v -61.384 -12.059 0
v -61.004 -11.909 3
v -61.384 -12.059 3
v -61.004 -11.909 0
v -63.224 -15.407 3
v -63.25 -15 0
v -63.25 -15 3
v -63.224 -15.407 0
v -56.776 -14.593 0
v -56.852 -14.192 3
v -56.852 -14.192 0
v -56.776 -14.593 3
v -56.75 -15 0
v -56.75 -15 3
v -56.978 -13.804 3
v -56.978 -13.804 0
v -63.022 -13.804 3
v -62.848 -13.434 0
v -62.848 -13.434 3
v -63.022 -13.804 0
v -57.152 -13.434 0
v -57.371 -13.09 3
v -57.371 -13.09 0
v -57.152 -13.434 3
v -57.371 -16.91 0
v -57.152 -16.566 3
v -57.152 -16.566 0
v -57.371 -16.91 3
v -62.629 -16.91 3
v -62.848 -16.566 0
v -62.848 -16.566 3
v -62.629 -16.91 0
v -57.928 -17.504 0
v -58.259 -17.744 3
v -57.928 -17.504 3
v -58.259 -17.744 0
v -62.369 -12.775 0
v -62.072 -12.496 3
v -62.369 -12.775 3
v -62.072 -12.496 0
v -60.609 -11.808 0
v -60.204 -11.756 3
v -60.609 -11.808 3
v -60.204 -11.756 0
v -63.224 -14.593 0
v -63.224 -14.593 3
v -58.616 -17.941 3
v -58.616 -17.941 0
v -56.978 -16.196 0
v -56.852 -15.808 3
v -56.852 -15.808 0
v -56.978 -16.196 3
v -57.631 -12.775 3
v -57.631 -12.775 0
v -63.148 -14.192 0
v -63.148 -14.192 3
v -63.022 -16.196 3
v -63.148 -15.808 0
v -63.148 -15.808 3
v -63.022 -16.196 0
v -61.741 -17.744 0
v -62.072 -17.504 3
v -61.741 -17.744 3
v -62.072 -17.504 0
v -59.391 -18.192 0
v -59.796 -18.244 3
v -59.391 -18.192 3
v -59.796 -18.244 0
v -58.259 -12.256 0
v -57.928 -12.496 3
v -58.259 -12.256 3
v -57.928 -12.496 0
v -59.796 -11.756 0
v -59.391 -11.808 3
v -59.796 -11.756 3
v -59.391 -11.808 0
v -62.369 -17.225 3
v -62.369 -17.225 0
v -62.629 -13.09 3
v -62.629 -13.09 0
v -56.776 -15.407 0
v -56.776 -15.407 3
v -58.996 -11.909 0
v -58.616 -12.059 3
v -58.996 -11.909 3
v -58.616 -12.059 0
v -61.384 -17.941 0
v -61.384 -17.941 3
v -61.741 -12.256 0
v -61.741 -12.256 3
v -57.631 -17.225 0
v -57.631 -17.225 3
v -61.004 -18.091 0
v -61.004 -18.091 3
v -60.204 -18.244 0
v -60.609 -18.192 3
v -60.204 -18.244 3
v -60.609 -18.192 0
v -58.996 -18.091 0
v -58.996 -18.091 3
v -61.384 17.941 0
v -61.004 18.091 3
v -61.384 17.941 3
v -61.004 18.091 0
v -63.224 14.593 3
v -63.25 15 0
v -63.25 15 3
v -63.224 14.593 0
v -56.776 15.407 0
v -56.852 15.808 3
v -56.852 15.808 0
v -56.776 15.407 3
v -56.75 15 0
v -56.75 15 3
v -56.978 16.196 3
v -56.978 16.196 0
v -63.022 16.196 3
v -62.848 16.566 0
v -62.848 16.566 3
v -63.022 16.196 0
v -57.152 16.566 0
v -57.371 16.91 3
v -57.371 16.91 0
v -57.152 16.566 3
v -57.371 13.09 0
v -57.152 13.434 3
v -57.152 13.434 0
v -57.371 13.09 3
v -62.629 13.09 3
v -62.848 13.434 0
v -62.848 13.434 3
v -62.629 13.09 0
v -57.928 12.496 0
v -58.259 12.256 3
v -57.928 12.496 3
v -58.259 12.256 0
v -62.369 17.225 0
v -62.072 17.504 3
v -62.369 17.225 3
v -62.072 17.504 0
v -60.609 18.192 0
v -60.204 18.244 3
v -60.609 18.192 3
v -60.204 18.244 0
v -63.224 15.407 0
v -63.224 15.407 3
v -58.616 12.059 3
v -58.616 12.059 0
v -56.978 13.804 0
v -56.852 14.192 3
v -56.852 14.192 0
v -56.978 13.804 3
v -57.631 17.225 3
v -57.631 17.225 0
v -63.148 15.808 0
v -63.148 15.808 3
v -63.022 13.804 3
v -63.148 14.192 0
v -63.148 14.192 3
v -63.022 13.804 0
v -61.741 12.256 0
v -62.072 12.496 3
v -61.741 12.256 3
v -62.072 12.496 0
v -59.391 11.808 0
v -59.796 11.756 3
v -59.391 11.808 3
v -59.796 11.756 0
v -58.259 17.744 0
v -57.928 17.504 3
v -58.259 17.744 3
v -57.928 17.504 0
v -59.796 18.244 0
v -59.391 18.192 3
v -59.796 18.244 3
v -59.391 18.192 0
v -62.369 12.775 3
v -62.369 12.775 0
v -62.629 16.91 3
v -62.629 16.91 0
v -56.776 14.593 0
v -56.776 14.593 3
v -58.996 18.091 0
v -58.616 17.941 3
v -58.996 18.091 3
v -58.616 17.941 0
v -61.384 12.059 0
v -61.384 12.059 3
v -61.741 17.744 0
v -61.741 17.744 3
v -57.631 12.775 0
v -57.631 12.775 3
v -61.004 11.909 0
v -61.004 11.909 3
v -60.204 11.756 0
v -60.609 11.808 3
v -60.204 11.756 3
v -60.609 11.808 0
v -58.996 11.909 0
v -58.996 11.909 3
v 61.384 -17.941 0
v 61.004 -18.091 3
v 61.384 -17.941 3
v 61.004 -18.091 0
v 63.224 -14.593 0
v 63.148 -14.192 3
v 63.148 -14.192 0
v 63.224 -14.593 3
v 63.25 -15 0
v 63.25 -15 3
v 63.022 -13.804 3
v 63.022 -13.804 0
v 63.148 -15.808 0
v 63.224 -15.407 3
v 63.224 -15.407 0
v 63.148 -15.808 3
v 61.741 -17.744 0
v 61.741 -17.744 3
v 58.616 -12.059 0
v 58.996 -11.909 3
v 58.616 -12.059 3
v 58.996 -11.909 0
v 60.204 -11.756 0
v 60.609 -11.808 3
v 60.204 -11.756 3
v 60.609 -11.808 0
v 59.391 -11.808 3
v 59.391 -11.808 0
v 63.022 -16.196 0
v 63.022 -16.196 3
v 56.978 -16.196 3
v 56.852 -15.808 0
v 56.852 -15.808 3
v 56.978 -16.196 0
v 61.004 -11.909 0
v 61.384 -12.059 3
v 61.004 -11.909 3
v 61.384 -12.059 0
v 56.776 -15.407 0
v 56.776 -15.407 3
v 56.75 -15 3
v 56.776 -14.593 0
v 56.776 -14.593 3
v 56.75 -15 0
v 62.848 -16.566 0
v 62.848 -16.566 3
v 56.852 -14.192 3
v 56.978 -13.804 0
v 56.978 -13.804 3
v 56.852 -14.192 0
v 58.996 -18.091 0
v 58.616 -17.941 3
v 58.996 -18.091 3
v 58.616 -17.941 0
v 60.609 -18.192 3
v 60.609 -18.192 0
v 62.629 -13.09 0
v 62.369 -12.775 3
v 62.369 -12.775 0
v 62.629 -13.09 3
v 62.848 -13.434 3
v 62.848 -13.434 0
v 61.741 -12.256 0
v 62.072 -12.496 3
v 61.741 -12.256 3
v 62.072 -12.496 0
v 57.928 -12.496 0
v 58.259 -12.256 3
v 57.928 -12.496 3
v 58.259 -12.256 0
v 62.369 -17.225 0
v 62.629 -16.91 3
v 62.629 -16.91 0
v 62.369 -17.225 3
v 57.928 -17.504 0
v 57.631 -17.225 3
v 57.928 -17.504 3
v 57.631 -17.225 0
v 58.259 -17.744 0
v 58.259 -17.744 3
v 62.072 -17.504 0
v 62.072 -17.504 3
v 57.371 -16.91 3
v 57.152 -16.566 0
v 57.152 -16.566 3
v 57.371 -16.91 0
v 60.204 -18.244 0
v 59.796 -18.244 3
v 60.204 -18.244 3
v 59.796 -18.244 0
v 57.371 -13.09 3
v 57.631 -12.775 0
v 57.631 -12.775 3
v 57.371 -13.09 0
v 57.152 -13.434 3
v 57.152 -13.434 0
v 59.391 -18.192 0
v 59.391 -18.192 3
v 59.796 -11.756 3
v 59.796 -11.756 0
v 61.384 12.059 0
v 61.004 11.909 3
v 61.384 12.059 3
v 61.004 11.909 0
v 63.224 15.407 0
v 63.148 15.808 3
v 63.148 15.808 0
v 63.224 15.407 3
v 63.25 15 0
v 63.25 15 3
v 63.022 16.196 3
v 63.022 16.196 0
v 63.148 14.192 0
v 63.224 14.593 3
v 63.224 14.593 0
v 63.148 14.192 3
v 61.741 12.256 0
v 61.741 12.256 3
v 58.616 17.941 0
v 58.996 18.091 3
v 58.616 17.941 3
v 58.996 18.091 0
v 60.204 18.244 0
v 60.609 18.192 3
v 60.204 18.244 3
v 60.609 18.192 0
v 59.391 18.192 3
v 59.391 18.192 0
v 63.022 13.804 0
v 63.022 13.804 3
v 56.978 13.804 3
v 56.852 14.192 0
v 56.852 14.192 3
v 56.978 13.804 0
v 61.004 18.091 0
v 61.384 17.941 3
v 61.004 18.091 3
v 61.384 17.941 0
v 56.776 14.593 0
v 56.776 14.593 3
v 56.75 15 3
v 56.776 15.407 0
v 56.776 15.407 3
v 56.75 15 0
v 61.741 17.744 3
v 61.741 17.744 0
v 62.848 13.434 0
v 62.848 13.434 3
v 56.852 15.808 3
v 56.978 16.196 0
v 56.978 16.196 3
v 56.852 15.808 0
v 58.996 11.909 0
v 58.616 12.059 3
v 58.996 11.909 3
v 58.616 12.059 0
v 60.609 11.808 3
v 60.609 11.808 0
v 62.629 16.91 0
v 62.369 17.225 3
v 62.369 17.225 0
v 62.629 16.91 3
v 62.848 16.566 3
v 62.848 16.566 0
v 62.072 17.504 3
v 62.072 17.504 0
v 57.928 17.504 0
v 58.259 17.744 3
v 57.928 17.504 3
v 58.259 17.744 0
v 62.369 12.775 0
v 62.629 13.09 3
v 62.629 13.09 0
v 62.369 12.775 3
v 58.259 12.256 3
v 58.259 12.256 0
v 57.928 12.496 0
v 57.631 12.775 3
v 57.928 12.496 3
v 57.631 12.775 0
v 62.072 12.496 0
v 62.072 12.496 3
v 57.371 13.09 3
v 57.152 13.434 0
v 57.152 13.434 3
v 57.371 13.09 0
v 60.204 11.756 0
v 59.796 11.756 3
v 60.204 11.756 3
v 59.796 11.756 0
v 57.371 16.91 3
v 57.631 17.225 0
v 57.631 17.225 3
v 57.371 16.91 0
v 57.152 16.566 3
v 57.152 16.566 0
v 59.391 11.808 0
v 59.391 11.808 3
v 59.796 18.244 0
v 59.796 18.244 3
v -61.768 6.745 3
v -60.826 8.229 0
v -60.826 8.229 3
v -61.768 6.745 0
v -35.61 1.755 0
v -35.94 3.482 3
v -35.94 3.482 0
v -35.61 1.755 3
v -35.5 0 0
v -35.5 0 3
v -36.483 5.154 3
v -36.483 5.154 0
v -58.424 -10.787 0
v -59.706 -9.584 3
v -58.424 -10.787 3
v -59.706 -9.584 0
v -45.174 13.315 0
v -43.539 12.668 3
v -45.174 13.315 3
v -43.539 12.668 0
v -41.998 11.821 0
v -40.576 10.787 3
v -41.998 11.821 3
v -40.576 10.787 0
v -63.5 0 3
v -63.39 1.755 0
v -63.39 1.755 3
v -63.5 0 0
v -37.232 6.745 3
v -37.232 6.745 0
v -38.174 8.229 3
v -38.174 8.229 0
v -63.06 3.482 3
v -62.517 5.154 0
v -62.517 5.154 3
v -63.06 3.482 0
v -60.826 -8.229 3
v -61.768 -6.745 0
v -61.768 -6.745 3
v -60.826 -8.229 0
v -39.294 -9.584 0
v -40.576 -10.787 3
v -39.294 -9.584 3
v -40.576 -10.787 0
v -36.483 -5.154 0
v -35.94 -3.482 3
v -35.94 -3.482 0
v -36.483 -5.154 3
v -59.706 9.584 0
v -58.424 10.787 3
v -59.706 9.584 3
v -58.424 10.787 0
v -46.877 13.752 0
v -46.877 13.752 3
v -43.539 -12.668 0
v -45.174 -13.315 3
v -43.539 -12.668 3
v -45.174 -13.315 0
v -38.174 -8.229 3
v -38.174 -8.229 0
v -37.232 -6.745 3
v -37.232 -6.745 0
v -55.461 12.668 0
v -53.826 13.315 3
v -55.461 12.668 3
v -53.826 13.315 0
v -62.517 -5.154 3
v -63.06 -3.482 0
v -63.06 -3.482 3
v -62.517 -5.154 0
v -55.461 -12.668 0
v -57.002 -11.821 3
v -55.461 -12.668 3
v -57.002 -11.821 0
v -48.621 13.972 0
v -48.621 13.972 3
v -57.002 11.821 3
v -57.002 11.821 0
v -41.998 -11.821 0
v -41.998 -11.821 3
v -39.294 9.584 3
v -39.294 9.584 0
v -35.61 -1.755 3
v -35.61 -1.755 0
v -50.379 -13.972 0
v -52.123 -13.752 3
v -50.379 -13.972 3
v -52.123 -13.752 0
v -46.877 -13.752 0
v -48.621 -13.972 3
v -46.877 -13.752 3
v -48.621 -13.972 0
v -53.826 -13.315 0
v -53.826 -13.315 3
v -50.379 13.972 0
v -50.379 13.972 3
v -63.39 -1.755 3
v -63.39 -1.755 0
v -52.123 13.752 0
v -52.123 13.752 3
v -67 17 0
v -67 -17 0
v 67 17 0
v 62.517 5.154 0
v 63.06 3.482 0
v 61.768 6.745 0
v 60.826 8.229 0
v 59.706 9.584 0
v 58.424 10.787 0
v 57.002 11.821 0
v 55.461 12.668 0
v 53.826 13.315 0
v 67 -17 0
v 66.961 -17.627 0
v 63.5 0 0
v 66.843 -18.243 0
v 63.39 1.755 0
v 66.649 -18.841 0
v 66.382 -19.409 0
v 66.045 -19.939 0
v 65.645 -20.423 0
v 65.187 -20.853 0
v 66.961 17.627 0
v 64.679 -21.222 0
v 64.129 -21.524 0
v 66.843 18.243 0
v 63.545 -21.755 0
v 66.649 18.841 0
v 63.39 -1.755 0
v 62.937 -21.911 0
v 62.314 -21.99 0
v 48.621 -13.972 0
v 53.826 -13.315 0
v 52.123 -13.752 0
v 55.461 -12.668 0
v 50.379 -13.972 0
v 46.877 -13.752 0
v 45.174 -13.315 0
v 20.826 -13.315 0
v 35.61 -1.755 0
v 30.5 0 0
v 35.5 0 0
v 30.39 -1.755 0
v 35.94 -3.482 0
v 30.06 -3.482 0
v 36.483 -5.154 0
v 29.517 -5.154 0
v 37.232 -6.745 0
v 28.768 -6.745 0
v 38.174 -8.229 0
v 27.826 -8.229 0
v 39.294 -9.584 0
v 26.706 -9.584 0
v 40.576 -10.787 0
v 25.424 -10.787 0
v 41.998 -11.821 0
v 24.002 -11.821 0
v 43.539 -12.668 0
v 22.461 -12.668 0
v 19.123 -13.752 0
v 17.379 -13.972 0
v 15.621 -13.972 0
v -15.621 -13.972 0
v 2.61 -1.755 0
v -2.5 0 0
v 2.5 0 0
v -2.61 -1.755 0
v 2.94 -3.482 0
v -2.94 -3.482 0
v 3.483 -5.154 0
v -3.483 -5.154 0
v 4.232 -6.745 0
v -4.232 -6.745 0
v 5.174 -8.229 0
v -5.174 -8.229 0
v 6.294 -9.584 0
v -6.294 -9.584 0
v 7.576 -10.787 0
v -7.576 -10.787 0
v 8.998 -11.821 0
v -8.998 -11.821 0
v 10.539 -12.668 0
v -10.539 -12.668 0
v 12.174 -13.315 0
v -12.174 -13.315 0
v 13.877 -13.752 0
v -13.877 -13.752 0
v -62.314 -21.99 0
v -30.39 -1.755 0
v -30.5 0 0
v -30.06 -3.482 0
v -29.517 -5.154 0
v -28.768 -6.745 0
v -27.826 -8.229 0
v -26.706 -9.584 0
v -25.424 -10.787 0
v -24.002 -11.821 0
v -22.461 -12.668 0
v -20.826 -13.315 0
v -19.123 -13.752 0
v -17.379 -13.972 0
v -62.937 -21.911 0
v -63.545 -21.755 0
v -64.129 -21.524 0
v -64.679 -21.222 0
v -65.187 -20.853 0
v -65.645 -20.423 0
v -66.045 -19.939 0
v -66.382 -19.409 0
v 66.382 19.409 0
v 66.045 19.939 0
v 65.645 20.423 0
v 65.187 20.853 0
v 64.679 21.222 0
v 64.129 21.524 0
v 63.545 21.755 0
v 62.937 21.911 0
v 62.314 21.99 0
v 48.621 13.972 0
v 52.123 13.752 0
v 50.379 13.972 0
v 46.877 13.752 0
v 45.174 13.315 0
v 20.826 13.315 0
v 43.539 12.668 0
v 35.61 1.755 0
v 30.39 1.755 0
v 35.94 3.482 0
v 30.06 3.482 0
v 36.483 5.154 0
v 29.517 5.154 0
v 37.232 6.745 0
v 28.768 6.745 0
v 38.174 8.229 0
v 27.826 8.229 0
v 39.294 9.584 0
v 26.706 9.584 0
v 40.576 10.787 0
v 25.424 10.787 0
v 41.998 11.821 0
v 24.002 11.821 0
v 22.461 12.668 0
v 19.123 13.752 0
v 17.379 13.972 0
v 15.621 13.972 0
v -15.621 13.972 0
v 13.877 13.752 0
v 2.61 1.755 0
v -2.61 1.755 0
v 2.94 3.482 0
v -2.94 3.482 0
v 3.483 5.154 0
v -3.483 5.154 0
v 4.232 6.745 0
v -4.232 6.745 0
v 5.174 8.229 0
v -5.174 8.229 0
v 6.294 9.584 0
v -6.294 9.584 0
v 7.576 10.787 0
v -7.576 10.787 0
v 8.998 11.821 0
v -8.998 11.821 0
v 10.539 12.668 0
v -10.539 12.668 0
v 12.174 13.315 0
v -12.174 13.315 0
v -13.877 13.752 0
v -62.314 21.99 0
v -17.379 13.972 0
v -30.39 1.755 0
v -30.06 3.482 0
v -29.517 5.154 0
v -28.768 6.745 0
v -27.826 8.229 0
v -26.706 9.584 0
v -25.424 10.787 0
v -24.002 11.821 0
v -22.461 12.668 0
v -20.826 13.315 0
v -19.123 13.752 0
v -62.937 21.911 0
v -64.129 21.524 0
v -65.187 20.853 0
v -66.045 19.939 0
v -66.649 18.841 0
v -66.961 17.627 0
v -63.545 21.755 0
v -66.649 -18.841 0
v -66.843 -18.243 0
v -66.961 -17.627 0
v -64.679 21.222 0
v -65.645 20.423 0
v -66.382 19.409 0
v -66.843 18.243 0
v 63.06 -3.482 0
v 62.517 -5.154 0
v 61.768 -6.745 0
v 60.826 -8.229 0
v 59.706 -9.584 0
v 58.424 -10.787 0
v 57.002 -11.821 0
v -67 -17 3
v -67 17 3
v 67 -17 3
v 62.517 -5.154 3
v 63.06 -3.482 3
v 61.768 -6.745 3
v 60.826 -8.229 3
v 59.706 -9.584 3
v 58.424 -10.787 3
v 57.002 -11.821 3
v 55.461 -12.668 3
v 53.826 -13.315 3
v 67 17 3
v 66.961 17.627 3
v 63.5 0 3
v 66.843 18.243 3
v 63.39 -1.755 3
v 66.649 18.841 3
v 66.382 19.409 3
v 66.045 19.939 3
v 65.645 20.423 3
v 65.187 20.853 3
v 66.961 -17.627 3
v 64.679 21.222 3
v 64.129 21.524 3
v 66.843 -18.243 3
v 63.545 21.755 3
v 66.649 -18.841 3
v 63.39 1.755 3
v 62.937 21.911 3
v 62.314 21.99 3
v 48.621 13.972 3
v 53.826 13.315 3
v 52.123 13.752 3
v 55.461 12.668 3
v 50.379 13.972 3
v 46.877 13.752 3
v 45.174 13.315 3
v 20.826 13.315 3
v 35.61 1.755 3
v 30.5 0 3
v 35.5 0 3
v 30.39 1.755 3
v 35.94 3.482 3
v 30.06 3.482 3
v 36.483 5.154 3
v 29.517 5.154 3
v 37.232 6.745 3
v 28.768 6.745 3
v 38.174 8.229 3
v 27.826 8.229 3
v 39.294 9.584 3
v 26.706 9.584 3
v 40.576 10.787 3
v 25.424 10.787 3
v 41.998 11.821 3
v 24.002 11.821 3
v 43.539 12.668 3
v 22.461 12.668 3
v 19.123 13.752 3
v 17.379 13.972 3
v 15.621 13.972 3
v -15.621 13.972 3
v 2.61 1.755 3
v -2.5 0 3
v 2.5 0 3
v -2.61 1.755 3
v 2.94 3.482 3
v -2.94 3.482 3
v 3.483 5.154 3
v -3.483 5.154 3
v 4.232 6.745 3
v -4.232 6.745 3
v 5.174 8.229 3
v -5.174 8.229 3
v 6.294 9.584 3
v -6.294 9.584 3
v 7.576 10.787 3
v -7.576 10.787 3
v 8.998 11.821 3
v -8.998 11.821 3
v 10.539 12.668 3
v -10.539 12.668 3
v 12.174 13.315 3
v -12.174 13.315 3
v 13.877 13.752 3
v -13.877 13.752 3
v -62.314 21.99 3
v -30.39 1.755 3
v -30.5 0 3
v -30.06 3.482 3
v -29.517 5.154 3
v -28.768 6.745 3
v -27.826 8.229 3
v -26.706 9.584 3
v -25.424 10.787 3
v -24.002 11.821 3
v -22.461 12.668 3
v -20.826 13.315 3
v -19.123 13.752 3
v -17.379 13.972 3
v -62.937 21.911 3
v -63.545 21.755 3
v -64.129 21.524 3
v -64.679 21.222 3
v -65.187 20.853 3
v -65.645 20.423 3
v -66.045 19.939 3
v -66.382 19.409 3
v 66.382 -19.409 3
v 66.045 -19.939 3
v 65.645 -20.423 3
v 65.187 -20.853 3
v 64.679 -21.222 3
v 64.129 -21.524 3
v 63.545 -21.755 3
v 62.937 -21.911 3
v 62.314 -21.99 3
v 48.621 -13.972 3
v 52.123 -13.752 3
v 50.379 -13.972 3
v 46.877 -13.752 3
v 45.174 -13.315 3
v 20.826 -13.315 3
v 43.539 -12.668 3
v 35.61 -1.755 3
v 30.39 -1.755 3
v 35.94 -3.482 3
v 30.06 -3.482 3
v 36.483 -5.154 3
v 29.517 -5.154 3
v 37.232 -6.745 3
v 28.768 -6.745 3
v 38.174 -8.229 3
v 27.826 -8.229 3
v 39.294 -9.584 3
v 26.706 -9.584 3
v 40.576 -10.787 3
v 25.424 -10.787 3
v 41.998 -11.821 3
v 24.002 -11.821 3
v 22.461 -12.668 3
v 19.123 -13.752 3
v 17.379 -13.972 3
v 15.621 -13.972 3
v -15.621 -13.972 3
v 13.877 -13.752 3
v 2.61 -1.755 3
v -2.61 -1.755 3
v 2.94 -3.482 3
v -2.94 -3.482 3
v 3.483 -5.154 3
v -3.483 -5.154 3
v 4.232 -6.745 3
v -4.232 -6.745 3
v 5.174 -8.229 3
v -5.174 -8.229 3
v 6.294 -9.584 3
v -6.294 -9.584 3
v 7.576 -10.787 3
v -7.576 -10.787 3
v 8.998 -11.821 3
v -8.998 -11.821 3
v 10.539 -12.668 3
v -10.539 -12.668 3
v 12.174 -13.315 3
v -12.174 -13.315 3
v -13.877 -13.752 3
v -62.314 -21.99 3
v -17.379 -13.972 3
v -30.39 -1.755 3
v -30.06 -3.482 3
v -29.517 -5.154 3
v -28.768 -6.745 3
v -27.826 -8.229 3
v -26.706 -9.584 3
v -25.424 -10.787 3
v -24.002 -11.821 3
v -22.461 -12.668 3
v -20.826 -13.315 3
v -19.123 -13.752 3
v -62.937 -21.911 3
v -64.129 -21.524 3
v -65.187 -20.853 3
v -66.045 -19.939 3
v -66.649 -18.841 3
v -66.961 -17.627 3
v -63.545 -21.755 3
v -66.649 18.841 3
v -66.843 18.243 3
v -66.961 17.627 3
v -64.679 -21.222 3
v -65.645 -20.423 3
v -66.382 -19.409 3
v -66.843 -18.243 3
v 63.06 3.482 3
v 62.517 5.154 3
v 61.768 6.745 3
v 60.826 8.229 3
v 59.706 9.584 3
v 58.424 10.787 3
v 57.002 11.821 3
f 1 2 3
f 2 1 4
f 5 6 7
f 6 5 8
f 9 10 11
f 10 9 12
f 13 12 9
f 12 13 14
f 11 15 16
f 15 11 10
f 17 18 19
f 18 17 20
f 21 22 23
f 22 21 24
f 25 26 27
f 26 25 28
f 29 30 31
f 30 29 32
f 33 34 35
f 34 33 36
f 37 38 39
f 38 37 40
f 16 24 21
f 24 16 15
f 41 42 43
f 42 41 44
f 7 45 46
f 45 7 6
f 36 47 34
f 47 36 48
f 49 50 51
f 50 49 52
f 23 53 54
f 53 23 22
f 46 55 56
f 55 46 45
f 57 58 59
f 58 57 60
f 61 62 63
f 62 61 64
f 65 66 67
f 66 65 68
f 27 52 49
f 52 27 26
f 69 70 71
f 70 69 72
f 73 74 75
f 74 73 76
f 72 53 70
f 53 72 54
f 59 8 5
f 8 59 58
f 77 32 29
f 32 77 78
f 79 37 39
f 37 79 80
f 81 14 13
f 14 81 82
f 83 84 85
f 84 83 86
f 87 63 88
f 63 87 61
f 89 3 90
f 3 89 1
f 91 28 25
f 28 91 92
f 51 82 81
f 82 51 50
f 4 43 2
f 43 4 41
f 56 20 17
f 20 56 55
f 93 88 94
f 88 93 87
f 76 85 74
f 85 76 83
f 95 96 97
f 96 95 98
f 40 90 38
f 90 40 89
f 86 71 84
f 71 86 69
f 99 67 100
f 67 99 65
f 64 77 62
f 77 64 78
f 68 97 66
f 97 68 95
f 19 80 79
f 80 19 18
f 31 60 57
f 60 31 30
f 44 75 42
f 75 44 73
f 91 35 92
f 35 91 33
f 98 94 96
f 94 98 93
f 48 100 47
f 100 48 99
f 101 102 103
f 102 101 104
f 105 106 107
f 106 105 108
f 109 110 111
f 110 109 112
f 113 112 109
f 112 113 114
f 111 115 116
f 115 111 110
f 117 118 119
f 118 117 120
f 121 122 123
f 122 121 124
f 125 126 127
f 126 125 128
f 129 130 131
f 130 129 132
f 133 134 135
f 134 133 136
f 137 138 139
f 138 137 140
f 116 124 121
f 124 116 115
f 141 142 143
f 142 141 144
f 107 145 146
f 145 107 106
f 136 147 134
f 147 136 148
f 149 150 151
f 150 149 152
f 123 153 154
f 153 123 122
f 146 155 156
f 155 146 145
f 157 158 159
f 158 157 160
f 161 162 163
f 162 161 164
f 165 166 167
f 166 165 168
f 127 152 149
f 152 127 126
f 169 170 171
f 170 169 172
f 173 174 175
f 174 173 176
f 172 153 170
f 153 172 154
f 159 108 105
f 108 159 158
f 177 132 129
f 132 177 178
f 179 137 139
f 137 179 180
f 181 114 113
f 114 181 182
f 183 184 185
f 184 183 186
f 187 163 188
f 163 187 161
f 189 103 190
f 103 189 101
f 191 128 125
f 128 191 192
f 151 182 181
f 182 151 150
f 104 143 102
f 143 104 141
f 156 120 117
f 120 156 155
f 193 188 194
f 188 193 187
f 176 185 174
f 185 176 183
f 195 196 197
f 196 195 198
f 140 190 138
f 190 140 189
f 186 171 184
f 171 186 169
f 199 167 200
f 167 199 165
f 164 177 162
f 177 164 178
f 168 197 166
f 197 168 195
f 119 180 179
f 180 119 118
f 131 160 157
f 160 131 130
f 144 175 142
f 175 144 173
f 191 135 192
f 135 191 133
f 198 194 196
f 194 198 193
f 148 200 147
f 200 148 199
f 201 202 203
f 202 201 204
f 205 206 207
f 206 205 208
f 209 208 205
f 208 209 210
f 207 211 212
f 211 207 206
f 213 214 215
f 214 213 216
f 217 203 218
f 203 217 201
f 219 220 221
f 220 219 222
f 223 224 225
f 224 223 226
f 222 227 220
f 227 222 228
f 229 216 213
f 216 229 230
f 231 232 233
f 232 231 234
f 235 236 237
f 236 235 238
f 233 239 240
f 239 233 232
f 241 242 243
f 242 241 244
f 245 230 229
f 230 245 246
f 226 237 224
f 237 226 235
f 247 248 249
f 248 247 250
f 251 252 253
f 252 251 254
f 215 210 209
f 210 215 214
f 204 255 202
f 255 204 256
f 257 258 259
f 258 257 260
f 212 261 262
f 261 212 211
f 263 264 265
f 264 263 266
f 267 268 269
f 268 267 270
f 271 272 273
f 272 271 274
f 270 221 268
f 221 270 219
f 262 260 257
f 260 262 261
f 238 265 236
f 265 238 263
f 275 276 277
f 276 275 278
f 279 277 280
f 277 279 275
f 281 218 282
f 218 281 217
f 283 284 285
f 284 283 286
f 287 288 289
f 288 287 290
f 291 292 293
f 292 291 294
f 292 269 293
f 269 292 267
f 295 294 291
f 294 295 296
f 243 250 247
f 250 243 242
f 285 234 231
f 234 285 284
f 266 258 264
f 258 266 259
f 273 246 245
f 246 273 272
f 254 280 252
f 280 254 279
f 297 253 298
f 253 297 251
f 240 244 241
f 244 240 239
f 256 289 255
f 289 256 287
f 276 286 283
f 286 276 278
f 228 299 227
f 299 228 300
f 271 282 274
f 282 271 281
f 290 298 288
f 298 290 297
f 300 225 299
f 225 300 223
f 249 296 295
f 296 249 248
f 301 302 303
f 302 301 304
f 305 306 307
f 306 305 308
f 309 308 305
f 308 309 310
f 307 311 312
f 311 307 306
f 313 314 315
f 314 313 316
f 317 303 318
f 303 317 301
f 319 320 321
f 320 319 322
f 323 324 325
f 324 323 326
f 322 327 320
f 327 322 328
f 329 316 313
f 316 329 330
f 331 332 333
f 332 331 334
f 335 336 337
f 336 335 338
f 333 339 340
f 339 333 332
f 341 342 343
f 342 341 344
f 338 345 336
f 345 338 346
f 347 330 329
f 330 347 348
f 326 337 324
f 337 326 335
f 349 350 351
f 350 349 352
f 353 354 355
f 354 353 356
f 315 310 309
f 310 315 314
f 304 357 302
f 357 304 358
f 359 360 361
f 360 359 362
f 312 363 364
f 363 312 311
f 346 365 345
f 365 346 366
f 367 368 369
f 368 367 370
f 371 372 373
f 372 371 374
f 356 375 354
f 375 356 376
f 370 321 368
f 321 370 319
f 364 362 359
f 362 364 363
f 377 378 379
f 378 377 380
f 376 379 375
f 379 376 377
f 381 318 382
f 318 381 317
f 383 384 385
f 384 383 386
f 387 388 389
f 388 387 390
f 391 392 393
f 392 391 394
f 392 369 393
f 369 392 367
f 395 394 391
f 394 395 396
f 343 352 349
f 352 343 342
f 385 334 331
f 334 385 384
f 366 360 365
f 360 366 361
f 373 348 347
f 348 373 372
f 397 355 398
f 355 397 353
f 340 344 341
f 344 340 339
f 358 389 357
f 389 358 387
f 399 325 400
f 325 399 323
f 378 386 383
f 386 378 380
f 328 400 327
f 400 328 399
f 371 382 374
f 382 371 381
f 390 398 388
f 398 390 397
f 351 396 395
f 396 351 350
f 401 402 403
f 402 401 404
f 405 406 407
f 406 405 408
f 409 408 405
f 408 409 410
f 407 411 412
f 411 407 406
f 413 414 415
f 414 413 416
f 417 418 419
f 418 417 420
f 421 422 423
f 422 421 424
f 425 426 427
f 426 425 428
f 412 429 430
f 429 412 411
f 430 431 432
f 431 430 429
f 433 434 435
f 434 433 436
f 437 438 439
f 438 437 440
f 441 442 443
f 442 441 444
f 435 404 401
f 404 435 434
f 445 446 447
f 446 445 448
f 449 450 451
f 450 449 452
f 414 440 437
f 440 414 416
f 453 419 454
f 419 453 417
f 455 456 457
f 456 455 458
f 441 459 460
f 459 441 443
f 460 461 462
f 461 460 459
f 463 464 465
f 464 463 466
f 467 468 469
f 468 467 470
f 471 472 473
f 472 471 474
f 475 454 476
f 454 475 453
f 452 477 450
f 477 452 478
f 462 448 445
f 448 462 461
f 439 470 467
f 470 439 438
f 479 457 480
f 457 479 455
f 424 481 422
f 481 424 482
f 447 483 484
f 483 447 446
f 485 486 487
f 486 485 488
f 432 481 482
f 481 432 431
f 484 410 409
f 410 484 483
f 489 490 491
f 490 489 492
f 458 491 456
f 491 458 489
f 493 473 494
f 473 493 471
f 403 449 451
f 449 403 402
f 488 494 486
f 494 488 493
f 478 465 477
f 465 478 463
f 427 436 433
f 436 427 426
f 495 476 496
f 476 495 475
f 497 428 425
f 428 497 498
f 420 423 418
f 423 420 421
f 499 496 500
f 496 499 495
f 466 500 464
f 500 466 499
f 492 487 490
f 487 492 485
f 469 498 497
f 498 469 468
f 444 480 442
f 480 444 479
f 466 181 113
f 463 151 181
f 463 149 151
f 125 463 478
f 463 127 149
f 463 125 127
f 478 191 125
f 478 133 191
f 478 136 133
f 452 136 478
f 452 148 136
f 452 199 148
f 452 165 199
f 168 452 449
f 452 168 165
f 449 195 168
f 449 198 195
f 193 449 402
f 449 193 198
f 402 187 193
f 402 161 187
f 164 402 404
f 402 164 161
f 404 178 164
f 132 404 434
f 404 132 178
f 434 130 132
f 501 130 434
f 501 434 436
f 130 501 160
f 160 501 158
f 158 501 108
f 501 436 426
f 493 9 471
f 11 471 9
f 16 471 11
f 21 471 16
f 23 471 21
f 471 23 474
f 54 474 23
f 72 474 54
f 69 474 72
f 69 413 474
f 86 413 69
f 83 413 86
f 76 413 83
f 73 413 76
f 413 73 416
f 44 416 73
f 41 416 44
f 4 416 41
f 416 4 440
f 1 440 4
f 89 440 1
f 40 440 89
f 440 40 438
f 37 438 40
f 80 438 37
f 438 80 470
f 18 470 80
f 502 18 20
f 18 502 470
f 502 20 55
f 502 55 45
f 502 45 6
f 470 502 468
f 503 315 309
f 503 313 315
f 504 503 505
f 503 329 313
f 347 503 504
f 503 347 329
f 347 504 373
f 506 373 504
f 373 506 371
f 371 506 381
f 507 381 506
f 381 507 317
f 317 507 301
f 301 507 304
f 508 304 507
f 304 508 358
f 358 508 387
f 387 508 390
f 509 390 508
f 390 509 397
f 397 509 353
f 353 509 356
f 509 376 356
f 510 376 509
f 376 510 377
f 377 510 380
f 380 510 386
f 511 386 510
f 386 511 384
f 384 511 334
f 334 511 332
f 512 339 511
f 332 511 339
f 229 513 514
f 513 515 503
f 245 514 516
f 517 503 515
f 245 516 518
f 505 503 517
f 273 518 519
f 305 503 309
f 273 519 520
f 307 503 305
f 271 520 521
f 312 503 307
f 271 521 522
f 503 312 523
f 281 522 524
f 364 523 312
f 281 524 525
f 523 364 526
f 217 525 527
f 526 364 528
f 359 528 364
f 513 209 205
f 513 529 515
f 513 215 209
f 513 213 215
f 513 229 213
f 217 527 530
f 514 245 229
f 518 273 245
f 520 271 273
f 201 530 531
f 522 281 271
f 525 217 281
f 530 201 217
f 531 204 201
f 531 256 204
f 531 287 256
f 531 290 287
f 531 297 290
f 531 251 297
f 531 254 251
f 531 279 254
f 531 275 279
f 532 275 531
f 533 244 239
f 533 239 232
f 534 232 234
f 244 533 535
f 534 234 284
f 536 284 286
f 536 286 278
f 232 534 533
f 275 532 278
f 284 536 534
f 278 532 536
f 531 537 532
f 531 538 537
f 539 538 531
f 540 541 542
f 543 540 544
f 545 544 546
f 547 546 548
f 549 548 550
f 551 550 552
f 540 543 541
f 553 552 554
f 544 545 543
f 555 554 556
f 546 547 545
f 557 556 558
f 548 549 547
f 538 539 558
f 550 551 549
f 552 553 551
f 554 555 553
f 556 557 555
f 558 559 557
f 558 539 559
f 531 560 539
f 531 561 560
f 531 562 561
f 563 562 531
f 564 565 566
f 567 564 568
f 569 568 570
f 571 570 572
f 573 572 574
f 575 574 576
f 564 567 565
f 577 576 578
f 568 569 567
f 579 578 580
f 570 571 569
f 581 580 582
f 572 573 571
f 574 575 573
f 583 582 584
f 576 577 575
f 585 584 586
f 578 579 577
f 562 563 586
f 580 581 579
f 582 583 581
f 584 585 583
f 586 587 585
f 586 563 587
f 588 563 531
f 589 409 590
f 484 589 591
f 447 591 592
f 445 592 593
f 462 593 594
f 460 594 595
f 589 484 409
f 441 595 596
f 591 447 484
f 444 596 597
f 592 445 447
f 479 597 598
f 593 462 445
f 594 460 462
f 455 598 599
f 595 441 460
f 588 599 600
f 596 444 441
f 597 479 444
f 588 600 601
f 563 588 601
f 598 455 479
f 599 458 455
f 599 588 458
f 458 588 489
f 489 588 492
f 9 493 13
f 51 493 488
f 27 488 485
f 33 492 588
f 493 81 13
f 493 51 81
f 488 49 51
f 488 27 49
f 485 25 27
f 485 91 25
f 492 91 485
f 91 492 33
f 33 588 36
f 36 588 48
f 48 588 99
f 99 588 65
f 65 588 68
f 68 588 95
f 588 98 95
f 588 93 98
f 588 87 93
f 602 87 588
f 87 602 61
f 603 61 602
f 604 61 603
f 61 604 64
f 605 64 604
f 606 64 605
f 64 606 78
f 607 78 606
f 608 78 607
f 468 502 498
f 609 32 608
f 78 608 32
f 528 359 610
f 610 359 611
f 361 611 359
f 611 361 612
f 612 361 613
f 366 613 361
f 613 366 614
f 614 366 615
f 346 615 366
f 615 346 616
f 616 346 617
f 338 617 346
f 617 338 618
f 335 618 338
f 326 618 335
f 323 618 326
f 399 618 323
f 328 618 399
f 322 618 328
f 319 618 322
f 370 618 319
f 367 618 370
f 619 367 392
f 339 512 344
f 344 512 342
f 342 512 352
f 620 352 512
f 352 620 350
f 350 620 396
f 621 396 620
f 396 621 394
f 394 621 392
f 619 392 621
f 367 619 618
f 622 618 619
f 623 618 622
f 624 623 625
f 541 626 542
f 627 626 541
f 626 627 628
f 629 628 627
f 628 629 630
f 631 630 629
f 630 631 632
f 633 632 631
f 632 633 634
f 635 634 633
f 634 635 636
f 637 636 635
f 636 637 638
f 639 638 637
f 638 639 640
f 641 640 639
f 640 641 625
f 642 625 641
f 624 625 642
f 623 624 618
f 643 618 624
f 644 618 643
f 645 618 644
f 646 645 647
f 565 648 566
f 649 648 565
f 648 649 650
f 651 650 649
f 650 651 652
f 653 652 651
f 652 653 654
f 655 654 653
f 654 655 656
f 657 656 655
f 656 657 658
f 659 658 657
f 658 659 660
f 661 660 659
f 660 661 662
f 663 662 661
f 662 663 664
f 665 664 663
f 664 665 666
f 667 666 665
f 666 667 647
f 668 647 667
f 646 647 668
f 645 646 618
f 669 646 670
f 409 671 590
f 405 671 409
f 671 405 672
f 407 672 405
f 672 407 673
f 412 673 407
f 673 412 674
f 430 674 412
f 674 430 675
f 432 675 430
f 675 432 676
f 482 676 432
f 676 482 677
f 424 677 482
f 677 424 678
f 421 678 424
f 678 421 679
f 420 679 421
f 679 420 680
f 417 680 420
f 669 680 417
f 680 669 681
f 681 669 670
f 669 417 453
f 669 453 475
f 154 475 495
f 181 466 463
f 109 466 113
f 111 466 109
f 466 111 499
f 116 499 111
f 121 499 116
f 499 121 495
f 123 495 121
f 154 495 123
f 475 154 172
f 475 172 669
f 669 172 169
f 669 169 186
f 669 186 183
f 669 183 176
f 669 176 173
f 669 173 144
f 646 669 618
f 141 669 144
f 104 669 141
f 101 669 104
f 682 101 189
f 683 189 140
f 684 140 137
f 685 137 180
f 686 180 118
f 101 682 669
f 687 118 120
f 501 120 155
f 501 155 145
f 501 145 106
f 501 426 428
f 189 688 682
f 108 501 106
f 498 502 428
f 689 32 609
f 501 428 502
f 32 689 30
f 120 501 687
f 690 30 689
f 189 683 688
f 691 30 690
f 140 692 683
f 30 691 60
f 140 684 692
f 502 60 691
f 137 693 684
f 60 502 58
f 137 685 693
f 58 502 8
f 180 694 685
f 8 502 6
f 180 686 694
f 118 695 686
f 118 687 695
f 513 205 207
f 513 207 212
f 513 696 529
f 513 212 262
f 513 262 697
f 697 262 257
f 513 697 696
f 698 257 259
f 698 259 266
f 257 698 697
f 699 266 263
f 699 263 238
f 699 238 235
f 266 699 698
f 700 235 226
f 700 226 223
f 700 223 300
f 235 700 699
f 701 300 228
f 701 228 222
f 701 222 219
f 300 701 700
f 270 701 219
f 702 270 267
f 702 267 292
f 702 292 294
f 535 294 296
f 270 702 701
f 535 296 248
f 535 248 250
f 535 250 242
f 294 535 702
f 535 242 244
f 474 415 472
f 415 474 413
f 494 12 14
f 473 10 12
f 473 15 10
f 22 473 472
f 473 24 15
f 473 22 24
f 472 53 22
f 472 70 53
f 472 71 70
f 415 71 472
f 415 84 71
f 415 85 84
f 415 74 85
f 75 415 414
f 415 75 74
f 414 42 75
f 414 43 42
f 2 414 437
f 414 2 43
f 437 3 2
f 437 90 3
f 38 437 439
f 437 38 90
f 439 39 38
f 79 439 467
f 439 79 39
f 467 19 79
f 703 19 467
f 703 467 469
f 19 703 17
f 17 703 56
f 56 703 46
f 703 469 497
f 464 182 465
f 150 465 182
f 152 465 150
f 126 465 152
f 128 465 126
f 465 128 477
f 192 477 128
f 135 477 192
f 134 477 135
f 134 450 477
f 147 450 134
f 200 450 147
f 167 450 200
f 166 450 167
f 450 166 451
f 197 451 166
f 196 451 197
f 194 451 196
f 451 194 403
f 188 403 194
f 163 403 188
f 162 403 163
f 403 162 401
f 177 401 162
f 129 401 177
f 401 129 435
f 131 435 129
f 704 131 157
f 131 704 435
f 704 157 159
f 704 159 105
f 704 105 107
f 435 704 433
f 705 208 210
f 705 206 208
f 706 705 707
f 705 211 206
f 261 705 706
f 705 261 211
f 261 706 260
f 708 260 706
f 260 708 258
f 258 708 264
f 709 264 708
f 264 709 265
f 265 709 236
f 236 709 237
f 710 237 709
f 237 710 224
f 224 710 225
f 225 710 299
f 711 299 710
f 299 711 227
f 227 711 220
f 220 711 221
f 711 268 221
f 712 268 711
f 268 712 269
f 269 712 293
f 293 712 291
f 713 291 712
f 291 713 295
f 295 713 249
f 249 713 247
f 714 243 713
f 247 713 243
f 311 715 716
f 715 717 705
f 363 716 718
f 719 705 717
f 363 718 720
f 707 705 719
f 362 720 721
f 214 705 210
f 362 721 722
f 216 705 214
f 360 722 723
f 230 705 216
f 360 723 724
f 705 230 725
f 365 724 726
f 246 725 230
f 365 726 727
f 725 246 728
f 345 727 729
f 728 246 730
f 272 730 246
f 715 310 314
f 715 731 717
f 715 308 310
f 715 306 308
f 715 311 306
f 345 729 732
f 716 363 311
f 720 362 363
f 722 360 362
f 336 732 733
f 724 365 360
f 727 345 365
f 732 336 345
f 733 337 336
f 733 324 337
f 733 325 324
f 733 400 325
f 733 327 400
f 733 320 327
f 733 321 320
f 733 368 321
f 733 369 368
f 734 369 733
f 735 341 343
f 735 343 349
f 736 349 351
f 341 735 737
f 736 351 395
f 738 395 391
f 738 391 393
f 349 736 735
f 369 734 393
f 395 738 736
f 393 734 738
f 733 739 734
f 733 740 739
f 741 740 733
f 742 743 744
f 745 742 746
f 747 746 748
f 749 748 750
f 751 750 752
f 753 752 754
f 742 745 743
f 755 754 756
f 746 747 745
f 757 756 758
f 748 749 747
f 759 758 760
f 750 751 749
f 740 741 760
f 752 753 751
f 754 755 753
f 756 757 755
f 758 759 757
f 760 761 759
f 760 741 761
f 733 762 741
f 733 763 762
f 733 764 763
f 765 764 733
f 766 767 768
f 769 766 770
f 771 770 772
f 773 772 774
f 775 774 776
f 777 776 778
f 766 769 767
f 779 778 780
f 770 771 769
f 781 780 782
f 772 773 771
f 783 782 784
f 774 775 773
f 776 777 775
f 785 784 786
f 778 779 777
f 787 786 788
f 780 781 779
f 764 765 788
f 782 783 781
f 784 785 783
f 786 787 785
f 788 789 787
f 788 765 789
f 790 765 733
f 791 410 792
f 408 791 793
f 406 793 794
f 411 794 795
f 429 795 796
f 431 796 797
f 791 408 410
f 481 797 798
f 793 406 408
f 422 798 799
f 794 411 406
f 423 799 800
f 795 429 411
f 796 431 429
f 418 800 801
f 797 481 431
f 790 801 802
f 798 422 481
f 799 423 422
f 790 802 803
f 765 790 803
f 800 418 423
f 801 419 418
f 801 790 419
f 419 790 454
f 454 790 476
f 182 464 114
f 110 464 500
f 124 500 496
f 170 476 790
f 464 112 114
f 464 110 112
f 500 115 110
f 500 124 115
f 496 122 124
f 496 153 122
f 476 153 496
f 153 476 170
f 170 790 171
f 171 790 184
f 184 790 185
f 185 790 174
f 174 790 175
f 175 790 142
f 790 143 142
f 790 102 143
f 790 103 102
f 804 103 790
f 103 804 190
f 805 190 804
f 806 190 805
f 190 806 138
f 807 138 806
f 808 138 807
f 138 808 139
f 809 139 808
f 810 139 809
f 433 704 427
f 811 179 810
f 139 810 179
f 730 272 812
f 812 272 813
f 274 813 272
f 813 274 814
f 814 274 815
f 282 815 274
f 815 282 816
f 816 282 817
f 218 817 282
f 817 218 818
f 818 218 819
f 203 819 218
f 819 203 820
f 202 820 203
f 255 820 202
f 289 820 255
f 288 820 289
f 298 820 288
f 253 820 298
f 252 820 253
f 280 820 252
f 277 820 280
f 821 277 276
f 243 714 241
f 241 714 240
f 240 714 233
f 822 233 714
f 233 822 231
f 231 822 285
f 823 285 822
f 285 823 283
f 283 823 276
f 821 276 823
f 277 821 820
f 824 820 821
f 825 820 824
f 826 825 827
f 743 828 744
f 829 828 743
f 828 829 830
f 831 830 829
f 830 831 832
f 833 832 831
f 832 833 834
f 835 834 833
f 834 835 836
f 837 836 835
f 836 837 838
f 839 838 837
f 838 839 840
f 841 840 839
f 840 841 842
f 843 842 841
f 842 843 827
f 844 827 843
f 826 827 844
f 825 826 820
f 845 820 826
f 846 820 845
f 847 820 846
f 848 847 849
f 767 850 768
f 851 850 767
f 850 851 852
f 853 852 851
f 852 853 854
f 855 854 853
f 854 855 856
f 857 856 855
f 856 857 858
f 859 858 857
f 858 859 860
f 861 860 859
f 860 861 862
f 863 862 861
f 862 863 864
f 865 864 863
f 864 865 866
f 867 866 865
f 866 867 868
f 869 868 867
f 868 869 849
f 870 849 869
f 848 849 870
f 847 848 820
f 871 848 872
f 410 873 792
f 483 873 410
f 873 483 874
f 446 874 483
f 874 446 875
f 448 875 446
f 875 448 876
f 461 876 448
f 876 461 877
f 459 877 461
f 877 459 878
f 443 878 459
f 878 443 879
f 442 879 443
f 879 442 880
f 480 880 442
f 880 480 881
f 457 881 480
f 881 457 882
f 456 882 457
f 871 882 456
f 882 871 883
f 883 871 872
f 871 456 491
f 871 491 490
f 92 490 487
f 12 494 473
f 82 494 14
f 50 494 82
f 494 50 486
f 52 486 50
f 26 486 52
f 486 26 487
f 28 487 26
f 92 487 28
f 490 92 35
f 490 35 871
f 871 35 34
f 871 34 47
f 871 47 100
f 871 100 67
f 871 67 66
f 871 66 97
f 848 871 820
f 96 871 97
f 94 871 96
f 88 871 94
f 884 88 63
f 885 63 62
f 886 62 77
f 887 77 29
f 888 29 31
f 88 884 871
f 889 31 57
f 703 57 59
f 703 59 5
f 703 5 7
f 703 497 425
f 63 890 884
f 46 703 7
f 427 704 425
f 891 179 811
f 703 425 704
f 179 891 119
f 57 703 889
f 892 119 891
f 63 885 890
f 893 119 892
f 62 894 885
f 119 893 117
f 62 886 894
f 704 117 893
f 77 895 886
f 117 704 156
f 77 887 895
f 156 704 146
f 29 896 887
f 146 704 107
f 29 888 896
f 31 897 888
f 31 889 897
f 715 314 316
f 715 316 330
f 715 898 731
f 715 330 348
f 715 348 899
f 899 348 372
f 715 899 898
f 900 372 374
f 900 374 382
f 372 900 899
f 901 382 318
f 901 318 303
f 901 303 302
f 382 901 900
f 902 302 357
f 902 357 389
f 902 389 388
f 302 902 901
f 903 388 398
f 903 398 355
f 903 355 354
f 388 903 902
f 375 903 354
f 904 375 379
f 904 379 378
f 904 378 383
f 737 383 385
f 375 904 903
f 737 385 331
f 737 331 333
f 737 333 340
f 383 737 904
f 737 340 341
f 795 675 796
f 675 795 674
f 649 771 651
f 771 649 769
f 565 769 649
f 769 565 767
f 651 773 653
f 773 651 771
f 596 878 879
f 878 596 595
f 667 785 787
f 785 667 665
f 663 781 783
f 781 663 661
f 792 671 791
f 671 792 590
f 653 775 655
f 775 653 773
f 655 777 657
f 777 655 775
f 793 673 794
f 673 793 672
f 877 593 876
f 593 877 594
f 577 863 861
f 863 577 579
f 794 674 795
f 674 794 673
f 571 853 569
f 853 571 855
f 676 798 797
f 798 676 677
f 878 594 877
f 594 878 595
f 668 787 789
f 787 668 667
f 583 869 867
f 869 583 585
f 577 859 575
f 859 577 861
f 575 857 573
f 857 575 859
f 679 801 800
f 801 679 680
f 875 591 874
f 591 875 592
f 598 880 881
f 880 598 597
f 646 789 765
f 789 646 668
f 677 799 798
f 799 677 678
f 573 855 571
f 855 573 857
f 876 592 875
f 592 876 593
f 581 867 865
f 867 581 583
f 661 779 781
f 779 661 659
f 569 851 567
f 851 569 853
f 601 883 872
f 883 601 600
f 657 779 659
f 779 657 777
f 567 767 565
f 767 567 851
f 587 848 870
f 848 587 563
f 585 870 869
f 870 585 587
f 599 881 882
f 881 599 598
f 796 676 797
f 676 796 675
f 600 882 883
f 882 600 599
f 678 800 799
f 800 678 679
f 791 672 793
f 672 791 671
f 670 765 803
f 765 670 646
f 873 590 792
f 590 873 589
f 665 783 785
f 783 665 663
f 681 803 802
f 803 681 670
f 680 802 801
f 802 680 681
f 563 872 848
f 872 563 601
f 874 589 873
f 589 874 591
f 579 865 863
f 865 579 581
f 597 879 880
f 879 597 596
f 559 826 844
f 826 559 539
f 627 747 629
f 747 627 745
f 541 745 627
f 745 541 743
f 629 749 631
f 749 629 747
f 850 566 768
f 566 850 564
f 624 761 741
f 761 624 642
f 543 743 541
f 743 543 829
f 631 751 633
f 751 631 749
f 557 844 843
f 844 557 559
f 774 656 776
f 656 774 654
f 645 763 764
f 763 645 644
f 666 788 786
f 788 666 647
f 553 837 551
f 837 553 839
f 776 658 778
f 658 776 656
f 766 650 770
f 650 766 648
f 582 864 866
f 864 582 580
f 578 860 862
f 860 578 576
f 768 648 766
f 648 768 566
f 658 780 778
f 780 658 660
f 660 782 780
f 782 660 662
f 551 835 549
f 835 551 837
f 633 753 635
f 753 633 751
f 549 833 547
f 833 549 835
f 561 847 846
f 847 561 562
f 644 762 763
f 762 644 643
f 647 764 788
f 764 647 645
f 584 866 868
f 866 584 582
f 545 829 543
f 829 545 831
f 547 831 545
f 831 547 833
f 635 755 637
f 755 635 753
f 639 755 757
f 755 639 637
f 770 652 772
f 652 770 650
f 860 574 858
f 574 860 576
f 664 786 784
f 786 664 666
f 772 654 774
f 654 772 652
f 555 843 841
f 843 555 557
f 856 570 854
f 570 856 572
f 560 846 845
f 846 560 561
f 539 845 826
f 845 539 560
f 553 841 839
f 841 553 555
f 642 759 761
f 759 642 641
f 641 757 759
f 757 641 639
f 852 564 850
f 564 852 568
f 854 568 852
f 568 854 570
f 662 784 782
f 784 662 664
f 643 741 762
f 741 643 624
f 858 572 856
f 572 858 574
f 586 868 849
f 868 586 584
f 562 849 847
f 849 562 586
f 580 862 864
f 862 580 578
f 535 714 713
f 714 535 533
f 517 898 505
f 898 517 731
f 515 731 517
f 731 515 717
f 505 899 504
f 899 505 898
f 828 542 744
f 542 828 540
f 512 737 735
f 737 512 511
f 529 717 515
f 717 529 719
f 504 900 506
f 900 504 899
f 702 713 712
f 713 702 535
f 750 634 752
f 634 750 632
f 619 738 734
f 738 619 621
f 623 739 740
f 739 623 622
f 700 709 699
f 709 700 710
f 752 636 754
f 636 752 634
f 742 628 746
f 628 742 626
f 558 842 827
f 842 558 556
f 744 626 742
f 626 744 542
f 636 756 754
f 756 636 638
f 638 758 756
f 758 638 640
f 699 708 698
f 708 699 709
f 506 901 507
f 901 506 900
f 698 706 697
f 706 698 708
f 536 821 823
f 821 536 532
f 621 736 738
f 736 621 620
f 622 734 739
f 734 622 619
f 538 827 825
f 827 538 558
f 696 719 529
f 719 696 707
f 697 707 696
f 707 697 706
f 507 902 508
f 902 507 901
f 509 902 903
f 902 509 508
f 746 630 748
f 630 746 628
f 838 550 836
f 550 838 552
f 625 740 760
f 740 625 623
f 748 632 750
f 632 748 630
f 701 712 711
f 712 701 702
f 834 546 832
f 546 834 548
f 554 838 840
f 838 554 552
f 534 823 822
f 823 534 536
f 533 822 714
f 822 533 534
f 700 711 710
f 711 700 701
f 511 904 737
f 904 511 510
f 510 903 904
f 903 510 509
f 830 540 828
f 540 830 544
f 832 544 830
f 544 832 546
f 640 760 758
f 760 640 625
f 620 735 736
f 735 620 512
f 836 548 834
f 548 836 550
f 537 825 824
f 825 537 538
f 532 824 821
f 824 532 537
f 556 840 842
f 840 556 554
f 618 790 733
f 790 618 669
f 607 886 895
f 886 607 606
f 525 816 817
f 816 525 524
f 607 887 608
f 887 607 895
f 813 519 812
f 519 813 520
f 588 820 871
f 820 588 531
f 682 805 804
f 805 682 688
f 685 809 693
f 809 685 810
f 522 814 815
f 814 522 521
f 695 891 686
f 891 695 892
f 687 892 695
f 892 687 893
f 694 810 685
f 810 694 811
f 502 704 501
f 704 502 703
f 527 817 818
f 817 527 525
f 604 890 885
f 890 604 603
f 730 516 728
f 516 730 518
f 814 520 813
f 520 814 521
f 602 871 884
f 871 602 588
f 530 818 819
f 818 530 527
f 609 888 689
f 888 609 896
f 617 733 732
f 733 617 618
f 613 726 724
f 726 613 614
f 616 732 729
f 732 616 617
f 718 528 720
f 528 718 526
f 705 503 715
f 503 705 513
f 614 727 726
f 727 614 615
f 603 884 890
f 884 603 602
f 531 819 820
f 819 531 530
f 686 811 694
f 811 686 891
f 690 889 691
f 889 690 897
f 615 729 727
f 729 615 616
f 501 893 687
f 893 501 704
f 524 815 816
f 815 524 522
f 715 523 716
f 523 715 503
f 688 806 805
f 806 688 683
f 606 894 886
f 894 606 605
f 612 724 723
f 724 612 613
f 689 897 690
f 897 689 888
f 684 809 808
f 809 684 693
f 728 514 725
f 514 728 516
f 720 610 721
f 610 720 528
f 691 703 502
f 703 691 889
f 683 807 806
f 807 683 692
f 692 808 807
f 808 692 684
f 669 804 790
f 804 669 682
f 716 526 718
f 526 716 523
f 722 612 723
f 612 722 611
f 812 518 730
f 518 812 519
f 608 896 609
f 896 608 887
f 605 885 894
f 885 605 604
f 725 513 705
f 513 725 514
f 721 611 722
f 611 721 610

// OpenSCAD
$fn = 50;


difference() {
	union() {
		hull() {
			translate(v = [-62.0000000000, 17.0000000000, 0]) {
				cylinder(h = 3, r = 5);
			}
			translate(v = [62.0000000000, 17.0000000000, 0]) {
				cylinder(h = 3, r = 5);
			}
			translate(v = [-62.0000000000, -17.0000000000, 0]) {
				cylinder(h = 3, r = 5);
			}
			translate(v = [62.0000000000, -17.0000000000, 0]) {
				cylinder(h = 3, r = 5);
			}
		}
	}
	union() {
		#translate(v = [-60.0000000000, -15.0000000000, -100.0000000000]) {
			cylinder(h = 200, r = 3.2500000000);
		}
		#translate(v = [-60.0000000000, 15.0000000000, -100.0000000000]) {
			cylinder(h = 200, r = 3.2500000000);
		}
		#translate(v = [60.0000000000, -15.0000000000, -100.0000000000]) {
			cylinder(h = 200, r = 3.2500000000);
		}
		#translate(v = [60.0000000000, 15.0000000000, -100.0000000000]) {
			cylinder(h = 200, r = 3.2500000000);
		}
		#translate(v = [-49.5000000000, 0, 0]) {
			cylinder(h = 3, r = 14.0000000000);
		}
		#translate(v = [-16.5000000000, 0, 0]) {
			cylinder(h = 3, r = 14.0000000000);
		}
		#translate(v = [16.5000000000, 0, 0]) {
			cylinder(h = 3, r = 14.0000000000);
		}
		#translate(v = [49.5000000000, 0, 0]) {
			cylinder(h = 3, r = 14.0000000000);
		}
	}
}
